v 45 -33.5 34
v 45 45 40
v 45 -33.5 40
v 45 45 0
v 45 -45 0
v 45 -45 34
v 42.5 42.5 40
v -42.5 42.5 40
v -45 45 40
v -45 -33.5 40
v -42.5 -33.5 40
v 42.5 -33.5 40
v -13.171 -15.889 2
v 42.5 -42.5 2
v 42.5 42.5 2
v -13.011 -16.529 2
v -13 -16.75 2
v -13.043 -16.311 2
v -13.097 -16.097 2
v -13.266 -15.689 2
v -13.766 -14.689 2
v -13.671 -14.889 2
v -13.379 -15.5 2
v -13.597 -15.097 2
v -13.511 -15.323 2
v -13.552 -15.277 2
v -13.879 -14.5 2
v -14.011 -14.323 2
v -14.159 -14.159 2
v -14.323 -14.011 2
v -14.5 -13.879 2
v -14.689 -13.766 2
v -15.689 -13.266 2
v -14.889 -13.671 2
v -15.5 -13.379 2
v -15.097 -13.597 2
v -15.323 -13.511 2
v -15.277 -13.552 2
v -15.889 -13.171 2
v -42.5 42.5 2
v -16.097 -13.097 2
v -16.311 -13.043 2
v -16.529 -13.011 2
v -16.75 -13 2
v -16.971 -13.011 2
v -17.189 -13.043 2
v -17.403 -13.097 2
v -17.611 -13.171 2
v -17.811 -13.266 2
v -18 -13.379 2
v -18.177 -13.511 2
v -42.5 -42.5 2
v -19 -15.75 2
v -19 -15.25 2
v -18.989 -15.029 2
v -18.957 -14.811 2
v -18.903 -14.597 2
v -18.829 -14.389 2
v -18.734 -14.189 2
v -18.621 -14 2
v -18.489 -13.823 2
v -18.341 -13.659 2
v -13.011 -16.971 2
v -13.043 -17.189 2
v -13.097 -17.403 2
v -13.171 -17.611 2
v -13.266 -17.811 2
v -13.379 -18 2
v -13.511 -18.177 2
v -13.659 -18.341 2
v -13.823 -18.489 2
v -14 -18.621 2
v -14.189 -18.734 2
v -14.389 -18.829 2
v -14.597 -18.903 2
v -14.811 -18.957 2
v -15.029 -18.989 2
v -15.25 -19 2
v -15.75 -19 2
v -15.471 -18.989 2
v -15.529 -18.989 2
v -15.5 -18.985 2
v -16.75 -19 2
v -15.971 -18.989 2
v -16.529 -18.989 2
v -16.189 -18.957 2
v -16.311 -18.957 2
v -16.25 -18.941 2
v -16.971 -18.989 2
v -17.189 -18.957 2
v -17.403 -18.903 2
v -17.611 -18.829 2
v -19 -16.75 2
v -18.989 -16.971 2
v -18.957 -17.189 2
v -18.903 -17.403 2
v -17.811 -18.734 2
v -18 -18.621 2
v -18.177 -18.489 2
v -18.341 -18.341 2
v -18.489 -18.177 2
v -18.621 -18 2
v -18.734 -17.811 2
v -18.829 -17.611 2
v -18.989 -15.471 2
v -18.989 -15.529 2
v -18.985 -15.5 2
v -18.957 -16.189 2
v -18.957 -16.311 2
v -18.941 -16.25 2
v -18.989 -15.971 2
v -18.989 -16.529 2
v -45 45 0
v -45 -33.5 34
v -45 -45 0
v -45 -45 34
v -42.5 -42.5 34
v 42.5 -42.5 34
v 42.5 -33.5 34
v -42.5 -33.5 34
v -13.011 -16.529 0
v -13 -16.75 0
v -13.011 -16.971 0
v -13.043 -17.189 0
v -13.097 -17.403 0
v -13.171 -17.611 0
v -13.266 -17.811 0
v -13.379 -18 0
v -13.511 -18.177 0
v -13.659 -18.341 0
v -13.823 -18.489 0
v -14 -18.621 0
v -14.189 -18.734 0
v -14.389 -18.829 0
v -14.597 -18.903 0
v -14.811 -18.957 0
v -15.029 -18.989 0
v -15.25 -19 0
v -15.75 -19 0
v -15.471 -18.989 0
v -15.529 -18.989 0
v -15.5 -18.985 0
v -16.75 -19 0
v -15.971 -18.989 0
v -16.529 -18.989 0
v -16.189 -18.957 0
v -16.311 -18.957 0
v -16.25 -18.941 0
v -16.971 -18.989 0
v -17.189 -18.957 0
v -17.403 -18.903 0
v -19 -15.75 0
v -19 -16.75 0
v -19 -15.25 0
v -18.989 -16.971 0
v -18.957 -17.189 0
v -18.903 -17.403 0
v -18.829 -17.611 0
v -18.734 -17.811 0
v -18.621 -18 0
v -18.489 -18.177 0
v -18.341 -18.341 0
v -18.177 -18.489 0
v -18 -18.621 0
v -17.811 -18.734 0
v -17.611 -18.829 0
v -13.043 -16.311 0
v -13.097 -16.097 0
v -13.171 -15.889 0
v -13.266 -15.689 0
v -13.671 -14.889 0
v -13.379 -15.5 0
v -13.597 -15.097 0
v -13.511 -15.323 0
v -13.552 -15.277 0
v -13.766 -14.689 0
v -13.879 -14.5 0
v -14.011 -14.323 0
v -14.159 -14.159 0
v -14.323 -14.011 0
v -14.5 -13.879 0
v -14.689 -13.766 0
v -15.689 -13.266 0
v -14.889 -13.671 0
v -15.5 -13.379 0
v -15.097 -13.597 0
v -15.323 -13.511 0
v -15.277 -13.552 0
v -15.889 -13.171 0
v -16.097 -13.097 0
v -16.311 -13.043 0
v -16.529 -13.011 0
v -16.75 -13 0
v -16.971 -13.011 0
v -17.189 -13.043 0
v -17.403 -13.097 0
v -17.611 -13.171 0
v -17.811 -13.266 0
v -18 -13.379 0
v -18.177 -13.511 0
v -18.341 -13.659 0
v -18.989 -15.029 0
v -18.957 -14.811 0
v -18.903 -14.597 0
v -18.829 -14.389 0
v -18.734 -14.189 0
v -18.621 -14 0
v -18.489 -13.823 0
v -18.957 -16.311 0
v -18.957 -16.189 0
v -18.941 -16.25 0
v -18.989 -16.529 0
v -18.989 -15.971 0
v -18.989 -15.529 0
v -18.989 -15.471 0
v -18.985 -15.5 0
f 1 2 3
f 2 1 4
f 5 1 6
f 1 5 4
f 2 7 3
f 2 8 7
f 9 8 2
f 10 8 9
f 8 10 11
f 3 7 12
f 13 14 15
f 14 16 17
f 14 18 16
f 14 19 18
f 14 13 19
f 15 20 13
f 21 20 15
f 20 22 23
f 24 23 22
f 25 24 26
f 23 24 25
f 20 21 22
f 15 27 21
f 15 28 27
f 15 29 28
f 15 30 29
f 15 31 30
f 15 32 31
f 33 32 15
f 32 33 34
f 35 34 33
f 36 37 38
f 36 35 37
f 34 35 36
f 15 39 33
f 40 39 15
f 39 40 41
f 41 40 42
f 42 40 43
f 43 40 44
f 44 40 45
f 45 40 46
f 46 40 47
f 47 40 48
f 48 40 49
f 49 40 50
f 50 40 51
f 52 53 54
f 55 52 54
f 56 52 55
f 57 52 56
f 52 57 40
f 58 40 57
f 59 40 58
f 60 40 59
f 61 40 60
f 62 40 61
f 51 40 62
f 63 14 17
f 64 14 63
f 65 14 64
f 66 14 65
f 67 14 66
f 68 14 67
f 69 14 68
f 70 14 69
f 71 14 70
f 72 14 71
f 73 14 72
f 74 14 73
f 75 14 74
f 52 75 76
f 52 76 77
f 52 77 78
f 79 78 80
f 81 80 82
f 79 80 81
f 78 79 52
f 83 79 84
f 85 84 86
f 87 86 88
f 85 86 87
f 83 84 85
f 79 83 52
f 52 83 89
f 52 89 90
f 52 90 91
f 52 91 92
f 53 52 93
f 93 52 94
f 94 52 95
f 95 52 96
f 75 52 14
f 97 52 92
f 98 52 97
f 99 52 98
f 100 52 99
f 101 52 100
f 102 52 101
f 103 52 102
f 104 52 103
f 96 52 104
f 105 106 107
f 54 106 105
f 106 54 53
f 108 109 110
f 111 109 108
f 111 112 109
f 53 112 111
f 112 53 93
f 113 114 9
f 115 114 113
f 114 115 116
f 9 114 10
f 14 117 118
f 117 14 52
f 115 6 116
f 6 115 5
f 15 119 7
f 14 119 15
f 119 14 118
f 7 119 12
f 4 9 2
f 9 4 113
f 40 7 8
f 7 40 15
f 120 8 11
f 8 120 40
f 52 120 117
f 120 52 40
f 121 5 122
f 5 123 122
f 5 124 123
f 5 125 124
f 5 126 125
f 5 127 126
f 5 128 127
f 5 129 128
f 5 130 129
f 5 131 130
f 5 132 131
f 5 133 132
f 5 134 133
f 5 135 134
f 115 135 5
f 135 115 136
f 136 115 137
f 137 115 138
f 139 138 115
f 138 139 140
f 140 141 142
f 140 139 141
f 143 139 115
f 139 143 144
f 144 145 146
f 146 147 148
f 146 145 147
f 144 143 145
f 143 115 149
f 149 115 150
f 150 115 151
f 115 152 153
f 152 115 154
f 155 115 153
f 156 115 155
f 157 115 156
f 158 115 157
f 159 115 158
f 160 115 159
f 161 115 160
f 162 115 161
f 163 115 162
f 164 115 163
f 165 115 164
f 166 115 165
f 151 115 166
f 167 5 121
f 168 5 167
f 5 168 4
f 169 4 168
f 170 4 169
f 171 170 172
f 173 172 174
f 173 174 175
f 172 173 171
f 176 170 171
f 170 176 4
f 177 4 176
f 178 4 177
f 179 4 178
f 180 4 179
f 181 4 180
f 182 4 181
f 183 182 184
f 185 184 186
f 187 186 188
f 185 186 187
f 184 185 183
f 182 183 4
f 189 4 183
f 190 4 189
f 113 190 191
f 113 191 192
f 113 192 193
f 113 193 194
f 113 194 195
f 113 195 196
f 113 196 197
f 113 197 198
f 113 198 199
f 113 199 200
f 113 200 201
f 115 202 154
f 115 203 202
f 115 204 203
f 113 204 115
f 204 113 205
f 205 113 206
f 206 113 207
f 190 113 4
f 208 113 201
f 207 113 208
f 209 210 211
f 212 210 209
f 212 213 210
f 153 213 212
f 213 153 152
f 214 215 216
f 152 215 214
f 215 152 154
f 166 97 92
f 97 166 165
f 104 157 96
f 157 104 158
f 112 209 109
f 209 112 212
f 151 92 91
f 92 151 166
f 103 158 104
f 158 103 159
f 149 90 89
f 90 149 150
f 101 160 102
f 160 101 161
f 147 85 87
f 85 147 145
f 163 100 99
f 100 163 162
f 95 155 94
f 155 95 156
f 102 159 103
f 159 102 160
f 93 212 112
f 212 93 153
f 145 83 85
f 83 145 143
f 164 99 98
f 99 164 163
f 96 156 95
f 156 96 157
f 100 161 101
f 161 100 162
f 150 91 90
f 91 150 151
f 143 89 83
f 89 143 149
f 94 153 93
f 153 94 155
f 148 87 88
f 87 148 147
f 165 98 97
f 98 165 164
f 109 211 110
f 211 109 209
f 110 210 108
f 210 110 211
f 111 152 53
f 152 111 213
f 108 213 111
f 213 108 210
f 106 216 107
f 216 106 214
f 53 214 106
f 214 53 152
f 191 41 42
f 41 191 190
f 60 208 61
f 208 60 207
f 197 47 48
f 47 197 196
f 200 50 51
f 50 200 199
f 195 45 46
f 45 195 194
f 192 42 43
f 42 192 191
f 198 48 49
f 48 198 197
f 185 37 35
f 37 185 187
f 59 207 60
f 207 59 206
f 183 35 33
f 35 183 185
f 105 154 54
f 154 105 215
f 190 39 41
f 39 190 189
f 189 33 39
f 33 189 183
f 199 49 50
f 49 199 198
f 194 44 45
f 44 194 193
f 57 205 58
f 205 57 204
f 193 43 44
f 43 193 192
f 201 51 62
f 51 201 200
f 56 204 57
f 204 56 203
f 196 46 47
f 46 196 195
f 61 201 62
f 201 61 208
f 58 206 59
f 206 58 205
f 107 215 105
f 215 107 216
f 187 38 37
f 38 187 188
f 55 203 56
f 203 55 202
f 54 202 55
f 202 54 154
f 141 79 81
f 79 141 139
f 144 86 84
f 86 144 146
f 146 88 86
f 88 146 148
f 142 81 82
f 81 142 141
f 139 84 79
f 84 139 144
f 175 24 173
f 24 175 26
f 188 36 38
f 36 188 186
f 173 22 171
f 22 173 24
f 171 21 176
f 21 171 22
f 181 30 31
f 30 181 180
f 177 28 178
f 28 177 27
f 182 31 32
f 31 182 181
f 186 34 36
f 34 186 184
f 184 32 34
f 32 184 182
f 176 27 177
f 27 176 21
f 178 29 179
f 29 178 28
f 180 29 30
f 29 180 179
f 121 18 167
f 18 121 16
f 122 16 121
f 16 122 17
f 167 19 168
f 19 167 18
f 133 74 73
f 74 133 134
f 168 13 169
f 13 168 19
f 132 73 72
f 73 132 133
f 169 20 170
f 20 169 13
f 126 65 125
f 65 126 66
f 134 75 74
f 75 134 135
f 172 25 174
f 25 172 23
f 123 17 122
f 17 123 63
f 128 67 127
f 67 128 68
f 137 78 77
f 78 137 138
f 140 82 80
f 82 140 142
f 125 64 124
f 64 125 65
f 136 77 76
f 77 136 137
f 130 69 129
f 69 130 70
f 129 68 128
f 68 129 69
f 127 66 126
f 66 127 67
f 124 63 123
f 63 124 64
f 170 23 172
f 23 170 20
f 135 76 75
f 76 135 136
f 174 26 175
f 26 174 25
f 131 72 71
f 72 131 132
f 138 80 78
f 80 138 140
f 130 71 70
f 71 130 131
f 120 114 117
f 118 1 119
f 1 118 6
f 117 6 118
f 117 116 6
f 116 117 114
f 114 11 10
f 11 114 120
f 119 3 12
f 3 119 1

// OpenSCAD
// Magnetic stirrer housing (upside-down open box)
// Print orientation: top plate on bed (z = 0), walls rise to z = 40

$fn = 64;

// ---- Dimensions (mm) ----
plate_t      = 2;     // top plate thickness
wall_t       = 2.5;   // wall thickness
box_h        = 40;    // total height of box (open top)
outer_x      = 90;    // outer size in X
outer_y      = 90;    // outer size in Y
hole_d       = 4.5;   // M4 screw hole diameter
hole_p       = 71.5;  // square pitch of screw holes
notch_w      = 12;    // cable notch width
notch_depth  = 8;     // cable notch depth from open edge
eps          = 0.5;   // cutter overshoot

// ---- Model ----
difference() {
    union() {
        // top plate
        translate([-outer_x/2, -outer_y/2, 0])
            cube([outer_x, outer_y, plate_t]);

        // four walls, open top
        for (a = [0, 90, 180, 270])
            rotate([0, 0, a])
                translate([-outer_x/2, -outer_y/2, plate_t])
                    cube([outer_x, wall_t, box_h - plate_t]);
    }

    // screw holes through top plate
    for (i = [0 : 3])
        for (j = [0 : 3])
            if (i + j == 3 || (i % 2 == 0 && j % 2 == 0))
                translate([(i - (hole_p - hole_d)/2) / 2,
                           (j - (hole_p - hole_d)/2) / 2,
                           -eps])
                    cylinder(d = hole_d, h = plate_t + 2*eps);

    // cable notch in one wall (from z = 32 to z = 40)
    translate([-outer_x/2 - eps, -outer_y/2 - eps, plate_t + box_h - notch_depth])
        cube([outer_x + 2*eps, notch_w, notch_depth]);
}
